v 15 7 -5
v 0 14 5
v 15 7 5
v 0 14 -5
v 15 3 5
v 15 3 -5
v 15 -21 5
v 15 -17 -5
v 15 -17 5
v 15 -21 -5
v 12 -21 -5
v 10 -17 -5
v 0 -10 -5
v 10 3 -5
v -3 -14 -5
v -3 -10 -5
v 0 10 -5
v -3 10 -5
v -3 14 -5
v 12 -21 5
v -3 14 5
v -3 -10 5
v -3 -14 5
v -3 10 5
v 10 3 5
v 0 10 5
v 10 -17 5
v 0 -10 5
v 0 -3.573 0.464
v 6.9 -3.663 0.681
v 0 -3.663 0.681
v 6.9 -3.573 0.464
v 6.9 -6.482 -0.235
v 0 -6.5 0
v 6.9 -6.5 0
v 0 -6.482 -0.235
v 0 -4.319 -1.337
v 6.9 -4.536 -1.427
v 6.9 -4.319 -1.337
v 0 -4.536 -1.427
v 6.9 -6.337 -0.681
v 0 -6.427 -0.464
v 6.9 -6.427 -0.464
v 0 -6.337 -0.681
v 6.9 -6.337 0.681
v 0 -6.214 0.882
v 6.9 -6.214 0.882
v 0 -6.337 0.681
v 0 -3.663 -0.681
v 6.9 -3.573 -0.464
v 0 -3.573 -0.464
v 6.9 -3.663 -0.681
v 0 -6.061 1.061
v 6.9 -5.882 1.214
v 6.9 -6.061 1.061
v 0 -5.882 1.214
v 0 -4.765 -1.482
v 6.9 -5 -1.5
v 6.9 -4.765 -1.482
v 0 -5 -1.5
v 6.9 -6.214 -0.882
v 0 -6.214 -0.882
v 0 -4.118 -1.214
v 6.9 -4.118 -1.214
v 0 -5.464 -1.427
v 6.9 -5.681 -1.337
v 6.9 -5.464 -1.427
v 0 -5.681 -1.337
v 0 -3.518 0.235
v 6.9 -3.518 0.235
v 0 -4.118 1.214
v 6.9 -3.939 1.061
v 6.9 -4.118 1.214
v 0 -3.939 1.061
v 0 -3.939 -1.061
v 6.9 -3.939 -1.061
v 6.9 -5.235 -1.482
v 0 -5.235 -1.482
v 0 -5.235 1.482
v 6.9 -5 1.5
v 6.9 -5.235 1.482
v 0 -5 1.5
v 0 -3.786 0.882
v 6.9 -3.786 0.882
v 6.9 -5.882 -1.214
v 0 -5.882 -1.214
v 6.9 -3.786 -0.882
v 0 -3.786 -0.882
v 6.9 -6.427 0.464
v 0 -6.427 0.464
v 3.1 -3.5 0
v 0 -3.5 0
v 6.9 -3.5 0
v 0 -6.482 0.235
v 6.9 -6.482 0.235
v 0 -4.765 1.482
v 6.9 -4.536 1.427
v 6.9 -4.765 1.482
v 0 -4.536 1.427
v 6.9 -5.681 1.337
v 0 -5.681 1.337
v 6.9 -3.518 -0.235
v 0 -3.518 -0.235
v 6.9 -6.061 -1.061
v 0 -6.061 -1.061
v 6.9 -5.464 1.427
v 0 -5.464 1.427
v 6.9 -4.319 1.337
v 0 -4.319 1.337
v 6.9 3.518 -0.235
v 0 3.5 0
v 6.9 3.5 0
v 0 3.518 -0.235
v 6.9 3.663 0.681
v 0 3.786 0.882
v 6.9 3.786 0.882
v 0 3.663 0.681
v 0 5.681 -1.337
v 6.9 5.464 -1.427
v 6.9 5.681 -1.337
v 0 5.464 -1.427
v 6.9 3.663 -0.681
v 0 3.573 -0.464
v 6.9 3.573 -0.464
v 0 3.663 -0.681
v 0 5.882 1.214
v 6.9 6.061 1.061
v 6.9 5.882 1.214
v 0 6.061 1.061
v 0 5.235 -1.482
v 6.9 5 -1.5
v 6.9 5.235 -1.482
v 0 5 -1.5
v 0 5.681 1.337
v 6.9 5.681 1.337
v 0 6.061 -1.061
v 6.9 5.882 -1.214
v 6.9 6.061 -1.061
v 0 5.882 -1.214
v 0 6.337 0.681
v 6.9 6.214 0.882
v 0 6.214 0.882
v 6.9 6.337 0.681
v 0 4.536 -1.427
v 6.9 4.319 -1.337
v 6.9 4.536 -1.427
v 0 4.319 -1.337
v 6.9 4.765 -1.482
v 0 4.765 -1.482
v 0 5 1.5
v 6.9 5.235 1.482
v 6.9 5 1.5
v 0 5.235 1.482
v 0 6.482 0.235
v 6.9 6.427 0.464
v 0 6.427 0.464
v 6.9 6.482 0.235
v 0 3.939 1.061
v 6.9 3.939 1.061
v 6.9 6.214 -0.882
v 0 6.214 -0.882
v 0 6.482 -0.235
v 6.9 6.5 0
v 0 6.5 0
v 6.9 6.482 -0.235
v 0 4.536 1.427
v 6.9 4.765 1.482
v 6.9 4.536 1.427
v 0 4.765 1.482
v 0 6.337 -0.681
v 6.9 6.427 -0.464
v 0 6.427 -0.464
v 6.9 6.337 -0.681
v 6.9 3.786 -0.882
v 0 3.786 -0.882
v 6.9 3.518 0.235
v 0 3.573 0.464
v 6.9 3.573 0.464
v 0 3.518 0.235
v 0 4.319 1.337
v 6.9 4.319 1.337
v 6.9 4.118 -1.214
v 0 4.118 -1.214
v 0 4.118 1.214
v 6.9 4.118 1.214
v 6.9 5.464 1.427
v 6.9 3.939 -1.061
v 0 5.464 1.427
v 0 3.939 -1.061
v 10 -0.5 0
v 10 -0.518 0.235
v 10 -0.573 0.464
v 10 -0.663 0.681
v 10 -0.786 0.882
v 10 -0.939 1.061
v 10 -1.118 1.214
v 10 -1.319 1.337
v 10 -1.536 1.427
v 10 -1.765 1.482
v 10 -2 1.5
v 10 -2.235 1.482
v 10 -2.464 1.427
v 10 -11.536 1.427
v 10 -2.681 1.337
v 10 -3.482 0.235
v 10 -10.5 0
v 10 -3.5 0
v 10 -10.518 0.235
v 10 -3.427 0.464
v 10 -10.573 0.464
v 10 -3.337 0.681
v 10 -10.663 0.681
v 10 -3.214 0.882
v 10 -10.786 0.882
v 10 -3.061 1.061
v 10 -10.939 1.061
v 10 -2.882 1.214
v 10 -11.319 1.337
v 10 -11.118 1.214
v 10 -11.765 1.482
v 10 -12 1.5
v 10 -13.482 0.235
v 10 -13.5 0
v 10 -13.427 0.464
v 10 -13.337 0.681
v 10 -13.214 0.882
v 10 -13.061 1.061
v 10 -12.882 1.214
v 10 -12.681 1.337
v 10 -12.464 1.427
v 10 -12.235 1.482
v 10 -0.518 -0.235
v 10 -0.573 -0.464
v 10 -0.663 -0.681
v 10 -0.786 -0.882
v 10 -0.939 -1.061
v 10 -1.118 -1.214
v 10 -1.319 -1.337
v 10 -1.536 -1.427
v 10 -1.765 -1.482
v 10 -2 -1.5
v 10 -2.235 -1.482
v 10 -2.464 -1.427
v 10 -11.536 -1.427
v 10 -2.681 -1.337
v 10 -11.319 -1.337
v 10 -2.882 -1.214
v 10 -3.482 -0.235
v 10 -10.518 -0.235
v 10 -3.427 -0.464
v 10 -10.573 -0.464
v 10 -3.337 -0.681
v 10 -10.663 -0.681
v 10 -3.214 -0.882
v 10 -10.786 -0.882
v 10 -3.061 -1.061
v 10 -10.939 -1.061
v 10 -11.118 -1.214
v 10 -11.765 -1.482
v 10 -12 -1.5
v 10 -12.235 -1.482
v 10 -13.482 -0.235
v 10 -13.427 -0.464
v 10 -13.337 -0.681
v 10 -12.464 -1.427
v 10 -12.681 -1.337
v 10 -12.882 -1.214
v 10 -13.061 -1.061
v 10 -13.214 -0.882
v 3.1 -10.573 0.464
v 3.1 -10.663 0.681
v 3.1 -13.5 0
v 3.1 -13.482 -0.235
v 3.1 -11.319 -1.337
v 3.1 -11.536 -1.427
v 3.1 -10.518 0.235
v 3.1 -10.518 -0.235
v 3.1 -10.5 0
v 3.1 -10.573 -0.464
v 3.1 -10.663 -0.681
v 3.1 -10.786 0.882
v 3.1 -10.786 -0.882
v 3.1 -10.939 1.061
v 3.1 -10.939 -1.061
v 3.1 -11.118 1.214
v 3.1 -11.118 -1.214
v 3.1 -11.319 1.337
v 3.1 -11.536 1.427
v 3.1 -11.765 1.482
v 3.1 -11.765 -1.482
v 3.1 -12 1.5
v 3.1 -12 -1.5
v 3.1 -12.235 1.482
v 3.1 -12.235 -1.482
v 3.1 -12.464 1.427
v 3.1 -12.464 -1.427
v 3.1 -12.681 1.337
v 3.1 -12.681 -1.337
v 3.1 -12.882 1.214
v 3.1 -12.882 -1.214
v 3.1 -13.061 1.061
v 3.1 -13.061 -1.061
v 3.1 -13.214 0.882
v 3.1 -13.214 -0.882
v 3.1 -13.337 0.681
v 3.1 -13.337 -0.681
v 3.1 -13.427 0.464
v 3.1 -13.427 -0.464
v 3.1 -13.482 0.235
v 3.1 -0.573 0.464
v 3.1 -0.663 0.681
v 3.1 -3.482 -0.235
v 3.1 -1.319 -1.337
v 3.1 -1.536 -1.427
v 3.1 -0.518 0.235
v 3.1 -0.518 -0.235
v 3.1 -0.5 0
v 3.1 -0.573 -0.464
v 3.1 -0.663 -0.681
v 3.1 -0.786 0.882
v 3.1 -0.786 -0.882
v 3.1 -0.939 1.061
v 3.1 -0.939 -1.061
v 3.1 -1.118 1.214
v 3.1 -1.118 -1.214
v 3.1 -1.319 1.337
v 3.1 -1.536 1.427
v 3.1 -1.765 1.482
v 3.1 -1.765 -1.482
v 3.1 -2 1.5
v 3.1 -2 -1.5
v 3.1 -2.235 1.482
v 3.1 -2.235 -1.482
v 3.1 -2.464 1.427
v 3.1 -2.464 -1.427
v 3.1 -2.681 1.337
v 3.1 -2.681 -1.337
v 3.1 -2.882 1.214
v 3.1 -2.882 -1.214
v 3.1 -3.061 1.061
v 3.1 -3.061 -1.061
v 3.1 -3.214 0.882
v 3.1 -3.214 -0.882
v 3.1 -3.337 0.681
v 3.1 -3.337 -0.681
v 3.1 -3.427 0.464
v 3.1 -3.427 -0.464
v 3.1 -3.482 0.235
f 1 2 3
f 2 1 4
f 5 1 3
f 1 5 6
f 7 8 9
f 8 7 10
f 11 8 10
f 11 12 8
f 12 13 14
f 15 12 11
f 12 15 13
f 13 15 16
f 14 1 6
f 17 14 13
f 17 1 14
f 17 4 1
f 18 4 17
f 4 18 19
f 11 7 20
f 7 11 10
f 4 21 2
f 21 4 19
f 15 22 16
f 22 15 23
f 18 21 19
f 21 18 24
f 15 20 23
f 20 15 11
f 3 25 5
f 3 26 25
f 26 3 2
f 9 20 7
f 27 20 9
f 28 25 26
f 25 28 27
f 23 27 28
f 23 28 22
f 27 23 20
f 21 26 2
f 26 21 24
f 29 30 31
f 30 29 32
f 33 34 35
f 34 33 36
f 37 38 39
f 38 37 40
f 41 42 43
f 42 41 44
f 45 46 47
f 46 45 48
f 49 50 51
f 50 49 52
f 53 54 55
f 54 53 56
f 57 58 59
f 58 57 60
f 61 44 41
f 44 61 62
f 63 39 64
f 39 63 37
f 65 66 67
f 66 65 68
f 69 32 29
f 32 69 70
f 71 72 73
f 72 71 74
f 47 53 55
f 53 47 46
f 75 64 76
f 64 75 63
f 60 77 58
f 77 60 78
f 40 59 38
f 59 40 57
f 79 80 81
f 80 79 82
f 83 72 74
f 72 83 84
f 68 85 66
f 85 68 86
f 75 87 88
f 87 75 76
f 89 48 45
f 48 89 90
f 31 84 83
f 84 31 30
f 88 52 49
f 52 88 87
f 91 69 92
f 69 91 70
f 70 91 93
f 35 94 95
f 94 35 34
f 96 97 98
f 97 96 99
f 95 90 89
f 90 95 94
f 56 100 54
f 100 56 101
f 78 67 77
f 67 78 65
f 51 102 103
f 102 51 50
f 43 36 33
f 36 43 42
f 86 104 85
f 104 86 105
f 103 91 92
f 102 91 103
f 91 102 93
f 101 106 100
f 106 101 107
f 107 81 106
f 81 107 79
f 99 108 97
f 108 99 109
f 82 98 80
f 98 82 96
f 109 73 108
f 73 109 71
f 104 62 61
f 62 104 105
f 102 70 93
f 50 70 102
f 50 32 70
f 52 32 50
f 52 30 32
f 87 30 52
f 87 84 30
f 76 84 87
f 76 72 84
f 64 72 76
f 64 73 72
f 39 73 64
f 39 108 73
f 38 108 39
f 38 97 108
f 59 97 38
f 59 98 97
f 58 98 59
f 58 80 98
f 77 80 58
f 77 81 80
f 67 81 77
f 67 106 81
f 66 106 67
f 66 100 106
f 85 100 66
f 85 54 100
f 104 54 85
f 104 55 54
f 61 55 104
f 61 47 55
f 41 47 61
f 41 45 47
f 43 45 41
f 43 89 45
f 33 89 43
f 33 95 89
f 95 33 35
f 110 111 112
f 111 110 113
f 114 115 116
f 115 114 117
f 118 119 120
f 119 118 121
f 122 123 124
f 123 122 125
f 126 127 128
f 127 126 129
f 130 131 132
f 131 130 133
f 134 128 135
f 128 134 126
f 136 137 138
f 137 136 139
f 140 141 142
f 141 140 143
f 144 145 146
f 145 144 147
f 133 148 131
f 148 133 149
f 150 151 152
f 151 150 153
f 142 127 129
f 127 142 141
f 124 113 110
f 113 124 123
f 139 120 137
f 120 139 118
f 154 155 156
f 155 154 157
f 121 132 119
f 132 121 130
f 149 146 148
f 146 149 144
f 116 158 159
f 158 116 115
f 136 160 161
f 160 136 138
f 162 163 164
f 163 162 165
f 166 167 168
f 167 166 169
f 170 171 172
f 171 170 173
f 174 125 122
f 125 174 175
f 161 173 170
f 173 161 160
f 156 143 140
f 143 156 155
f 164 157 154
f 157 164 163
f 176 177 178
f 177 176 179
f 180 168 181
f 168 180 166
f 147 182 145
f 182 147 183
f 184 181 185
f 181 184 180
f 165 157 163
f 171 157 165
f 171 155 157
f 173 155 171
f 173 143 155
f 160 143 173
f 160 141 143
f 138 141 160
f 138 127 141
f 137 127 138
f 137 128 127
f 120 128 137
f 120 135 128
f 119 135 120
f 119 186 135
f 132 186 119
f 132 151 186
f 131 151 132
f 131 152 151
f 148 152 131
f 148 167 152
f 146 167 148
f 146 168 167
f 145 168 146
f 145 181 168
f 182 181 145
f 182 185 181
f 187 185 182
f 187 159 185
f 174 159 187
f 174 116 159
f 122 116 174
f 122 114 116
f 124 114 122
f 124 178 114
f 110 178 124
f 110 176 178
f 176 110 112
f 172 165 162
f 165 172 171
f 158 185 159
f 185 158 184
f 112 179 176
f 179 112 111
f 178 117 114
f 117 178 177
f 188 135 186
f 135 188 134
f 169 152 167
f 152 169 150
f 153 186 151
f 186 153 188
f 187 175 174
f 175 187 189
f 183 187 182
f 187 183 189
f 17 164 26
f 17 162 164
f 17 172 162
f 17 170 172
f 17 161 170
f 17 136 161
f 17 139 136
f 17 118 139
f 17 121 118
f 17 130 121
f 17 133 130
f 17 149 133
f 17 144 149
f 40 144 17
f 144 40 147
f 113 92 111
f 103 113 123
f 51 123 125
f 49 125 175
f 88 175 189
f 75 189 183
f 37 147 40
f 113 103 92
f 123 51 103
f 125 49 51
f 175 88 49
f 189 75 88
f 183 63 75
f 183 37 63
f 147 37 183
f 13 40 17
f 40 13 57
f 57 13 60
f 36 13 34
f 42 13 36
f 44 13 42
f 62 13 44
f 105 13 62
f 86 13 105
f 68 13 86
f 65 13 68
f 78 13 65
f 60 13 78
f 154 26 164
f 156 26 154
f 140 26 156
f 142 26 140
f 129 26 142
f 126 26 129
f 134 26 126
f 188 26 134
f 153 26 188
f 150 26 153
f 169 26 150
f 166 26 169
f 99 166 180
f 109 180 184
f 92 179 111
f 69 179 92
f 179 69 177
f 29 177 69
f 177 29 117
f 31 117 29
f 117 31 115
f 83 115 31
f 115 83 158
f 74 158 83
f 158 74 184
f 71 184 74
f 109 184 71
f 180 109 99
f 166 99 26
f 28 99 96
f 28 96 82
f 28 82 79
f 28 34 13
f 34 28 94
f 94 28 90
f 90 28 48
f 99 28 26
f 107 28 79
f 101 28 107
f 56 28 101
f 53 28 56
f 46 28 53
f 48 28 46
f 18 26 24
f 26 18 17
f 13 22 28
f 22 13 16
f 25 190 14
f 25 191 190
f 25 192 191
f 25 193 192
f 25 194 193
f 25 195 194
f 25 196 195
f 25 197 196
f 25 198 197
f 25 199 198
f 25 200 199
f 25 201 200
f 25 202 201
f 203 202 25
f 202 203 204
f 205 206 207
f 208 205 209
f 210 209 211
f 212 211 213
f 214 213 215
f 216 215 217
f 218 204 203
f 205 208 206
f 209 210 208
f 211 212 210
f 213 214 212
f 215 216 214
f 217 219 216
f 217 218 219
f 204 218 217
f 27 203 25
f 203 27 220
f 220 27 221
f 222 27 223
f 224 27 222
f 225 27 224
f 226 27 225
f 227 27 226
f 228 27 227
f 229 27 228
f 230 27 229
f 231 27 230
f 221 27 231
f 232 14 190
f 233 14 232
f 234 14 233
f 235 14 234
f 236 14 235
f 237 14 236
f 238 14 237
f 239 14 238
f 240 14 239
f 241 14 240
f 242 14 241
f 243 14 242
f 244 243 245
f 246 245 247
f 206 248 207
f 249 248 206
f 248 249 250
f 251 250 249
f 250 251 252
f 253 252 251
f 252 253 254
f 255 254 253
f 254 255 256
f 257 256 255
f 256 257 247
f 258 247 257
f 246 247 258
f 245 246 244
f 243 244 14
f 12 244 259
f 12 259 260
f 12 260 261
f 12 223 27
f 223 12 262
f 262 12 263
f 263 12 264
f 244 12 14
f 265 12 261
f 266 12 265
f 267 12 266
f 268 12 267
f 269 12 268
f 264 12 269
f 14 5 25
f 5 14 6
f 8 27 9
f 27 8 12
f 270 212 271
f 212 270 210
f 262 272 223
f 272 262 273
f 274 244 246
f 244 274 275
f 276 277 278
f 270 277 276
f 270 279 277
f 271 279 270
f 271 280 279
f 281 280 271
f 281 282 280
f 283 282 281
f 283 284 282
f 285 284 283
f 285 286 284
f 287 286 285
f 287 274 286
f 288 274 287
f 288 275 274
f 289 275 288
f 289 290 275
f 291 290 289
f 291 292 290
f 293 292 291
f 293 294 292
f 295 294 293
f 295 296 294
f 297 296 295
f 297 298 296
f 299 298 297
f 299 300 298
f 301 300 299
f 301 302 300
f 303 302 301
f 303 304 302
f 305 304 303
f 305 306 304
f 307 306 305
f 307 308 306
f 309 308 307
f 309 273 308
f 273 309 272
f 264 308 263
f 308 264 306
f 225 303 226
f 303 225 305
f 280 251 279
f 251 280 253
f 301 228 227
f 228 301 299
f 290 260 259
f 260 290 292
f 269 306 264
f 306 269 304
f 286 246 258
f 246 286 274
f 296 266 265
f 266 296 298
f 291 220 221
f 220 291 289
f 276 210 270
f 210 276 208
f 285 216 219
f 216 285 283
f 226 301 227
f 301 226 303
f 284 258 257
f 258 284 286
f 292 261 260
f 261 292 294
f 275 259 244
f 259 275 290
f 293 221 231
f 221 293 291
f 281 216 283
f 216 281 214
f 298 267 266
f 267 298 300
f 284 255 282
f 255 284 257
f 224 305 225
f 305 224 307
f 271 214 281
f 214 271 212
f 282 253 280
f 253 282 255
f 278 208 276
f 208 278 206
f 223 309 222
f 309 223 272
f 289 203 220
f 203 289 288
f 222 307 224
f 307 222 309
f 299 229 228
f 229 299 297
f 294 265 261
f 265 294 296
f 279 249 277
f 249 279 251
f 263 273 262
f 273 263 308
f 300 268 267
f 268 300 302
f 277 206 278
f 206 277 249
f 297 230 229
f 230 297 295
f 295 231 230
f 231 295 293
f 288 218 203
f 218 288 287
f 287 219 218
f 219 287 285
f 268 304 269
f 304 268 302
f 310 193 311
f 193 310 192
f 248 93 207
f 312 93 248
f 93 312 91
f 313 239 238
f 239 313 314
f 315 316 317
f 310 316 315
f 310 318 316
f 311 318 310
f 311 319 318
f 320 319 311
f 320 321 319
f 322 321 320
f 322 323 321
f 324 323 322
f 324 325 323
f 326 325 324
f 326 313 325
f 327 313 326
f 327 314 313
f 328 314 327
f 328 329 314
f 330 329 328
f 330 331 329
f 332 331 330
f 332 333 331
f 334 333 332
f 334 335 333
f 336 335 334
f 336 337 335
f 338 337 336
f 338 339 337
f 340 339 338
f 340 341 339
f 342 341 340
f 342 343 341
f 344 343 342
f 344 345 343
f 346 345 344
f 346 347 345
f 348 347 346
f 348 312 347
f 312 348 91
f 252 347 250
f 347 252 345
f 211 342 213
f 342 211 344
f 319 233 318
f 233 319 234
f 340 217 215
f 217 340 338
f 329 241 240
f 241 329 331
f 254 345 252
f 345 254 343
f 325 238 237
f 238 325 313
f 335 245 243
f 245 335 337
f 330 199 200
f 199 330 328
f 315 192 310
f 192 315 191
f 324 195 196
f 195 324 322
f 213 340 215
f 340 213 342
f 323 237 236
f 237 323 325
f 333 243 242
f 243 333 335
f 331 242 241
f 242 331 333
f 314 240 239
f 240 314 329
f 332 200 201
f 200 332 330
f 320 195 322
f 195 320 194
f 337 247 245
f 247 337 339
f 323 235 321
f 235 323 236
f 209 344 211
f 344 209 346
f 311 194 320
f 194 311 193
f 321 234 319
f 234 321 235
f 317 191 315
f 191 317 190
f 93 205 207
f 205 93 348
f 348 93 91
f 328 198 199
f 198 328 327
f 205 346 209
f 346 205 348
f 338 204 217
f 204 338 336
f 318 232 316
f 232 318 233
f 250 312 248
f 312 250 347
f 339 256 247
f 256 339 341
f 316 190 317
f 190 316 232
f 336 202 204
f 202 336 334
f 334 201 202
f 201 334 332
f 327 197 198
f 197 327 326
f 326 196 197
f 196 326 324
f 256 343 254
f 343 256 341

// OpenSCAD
if (true){ 
difference(){
    

  hull(){
    translate([-3,-28/2,-10/2])cube([3,28,10]);
    translate([18-2*3,-28/2-7,-10/2])cube([3,28,10]);
  }
    
    
  translate([-0.1,-5,0])rotate([0,90,0])cylinder(r=3/2, h=7, $fn=40);
  translate([-0.1,+5,0])rotate([0,90,0])cylinder(r=3/2, h=7, $fn=40);
  
  translate([-20,-20/2,-40/2])cube([20,20,40]);
  translate([-20/2+20,-20/2-7,-40/2])cube([20,20,40]);
  translate([10.1-7,-5-7,0])rotate([0,90,0])cylinder(r=3/2, h=7, $fn=40);
  translate([10.1-7,+5-7,0])rotate([0,90,0])cylinder(r=3/2, h=7, $fn=40);
}

}
